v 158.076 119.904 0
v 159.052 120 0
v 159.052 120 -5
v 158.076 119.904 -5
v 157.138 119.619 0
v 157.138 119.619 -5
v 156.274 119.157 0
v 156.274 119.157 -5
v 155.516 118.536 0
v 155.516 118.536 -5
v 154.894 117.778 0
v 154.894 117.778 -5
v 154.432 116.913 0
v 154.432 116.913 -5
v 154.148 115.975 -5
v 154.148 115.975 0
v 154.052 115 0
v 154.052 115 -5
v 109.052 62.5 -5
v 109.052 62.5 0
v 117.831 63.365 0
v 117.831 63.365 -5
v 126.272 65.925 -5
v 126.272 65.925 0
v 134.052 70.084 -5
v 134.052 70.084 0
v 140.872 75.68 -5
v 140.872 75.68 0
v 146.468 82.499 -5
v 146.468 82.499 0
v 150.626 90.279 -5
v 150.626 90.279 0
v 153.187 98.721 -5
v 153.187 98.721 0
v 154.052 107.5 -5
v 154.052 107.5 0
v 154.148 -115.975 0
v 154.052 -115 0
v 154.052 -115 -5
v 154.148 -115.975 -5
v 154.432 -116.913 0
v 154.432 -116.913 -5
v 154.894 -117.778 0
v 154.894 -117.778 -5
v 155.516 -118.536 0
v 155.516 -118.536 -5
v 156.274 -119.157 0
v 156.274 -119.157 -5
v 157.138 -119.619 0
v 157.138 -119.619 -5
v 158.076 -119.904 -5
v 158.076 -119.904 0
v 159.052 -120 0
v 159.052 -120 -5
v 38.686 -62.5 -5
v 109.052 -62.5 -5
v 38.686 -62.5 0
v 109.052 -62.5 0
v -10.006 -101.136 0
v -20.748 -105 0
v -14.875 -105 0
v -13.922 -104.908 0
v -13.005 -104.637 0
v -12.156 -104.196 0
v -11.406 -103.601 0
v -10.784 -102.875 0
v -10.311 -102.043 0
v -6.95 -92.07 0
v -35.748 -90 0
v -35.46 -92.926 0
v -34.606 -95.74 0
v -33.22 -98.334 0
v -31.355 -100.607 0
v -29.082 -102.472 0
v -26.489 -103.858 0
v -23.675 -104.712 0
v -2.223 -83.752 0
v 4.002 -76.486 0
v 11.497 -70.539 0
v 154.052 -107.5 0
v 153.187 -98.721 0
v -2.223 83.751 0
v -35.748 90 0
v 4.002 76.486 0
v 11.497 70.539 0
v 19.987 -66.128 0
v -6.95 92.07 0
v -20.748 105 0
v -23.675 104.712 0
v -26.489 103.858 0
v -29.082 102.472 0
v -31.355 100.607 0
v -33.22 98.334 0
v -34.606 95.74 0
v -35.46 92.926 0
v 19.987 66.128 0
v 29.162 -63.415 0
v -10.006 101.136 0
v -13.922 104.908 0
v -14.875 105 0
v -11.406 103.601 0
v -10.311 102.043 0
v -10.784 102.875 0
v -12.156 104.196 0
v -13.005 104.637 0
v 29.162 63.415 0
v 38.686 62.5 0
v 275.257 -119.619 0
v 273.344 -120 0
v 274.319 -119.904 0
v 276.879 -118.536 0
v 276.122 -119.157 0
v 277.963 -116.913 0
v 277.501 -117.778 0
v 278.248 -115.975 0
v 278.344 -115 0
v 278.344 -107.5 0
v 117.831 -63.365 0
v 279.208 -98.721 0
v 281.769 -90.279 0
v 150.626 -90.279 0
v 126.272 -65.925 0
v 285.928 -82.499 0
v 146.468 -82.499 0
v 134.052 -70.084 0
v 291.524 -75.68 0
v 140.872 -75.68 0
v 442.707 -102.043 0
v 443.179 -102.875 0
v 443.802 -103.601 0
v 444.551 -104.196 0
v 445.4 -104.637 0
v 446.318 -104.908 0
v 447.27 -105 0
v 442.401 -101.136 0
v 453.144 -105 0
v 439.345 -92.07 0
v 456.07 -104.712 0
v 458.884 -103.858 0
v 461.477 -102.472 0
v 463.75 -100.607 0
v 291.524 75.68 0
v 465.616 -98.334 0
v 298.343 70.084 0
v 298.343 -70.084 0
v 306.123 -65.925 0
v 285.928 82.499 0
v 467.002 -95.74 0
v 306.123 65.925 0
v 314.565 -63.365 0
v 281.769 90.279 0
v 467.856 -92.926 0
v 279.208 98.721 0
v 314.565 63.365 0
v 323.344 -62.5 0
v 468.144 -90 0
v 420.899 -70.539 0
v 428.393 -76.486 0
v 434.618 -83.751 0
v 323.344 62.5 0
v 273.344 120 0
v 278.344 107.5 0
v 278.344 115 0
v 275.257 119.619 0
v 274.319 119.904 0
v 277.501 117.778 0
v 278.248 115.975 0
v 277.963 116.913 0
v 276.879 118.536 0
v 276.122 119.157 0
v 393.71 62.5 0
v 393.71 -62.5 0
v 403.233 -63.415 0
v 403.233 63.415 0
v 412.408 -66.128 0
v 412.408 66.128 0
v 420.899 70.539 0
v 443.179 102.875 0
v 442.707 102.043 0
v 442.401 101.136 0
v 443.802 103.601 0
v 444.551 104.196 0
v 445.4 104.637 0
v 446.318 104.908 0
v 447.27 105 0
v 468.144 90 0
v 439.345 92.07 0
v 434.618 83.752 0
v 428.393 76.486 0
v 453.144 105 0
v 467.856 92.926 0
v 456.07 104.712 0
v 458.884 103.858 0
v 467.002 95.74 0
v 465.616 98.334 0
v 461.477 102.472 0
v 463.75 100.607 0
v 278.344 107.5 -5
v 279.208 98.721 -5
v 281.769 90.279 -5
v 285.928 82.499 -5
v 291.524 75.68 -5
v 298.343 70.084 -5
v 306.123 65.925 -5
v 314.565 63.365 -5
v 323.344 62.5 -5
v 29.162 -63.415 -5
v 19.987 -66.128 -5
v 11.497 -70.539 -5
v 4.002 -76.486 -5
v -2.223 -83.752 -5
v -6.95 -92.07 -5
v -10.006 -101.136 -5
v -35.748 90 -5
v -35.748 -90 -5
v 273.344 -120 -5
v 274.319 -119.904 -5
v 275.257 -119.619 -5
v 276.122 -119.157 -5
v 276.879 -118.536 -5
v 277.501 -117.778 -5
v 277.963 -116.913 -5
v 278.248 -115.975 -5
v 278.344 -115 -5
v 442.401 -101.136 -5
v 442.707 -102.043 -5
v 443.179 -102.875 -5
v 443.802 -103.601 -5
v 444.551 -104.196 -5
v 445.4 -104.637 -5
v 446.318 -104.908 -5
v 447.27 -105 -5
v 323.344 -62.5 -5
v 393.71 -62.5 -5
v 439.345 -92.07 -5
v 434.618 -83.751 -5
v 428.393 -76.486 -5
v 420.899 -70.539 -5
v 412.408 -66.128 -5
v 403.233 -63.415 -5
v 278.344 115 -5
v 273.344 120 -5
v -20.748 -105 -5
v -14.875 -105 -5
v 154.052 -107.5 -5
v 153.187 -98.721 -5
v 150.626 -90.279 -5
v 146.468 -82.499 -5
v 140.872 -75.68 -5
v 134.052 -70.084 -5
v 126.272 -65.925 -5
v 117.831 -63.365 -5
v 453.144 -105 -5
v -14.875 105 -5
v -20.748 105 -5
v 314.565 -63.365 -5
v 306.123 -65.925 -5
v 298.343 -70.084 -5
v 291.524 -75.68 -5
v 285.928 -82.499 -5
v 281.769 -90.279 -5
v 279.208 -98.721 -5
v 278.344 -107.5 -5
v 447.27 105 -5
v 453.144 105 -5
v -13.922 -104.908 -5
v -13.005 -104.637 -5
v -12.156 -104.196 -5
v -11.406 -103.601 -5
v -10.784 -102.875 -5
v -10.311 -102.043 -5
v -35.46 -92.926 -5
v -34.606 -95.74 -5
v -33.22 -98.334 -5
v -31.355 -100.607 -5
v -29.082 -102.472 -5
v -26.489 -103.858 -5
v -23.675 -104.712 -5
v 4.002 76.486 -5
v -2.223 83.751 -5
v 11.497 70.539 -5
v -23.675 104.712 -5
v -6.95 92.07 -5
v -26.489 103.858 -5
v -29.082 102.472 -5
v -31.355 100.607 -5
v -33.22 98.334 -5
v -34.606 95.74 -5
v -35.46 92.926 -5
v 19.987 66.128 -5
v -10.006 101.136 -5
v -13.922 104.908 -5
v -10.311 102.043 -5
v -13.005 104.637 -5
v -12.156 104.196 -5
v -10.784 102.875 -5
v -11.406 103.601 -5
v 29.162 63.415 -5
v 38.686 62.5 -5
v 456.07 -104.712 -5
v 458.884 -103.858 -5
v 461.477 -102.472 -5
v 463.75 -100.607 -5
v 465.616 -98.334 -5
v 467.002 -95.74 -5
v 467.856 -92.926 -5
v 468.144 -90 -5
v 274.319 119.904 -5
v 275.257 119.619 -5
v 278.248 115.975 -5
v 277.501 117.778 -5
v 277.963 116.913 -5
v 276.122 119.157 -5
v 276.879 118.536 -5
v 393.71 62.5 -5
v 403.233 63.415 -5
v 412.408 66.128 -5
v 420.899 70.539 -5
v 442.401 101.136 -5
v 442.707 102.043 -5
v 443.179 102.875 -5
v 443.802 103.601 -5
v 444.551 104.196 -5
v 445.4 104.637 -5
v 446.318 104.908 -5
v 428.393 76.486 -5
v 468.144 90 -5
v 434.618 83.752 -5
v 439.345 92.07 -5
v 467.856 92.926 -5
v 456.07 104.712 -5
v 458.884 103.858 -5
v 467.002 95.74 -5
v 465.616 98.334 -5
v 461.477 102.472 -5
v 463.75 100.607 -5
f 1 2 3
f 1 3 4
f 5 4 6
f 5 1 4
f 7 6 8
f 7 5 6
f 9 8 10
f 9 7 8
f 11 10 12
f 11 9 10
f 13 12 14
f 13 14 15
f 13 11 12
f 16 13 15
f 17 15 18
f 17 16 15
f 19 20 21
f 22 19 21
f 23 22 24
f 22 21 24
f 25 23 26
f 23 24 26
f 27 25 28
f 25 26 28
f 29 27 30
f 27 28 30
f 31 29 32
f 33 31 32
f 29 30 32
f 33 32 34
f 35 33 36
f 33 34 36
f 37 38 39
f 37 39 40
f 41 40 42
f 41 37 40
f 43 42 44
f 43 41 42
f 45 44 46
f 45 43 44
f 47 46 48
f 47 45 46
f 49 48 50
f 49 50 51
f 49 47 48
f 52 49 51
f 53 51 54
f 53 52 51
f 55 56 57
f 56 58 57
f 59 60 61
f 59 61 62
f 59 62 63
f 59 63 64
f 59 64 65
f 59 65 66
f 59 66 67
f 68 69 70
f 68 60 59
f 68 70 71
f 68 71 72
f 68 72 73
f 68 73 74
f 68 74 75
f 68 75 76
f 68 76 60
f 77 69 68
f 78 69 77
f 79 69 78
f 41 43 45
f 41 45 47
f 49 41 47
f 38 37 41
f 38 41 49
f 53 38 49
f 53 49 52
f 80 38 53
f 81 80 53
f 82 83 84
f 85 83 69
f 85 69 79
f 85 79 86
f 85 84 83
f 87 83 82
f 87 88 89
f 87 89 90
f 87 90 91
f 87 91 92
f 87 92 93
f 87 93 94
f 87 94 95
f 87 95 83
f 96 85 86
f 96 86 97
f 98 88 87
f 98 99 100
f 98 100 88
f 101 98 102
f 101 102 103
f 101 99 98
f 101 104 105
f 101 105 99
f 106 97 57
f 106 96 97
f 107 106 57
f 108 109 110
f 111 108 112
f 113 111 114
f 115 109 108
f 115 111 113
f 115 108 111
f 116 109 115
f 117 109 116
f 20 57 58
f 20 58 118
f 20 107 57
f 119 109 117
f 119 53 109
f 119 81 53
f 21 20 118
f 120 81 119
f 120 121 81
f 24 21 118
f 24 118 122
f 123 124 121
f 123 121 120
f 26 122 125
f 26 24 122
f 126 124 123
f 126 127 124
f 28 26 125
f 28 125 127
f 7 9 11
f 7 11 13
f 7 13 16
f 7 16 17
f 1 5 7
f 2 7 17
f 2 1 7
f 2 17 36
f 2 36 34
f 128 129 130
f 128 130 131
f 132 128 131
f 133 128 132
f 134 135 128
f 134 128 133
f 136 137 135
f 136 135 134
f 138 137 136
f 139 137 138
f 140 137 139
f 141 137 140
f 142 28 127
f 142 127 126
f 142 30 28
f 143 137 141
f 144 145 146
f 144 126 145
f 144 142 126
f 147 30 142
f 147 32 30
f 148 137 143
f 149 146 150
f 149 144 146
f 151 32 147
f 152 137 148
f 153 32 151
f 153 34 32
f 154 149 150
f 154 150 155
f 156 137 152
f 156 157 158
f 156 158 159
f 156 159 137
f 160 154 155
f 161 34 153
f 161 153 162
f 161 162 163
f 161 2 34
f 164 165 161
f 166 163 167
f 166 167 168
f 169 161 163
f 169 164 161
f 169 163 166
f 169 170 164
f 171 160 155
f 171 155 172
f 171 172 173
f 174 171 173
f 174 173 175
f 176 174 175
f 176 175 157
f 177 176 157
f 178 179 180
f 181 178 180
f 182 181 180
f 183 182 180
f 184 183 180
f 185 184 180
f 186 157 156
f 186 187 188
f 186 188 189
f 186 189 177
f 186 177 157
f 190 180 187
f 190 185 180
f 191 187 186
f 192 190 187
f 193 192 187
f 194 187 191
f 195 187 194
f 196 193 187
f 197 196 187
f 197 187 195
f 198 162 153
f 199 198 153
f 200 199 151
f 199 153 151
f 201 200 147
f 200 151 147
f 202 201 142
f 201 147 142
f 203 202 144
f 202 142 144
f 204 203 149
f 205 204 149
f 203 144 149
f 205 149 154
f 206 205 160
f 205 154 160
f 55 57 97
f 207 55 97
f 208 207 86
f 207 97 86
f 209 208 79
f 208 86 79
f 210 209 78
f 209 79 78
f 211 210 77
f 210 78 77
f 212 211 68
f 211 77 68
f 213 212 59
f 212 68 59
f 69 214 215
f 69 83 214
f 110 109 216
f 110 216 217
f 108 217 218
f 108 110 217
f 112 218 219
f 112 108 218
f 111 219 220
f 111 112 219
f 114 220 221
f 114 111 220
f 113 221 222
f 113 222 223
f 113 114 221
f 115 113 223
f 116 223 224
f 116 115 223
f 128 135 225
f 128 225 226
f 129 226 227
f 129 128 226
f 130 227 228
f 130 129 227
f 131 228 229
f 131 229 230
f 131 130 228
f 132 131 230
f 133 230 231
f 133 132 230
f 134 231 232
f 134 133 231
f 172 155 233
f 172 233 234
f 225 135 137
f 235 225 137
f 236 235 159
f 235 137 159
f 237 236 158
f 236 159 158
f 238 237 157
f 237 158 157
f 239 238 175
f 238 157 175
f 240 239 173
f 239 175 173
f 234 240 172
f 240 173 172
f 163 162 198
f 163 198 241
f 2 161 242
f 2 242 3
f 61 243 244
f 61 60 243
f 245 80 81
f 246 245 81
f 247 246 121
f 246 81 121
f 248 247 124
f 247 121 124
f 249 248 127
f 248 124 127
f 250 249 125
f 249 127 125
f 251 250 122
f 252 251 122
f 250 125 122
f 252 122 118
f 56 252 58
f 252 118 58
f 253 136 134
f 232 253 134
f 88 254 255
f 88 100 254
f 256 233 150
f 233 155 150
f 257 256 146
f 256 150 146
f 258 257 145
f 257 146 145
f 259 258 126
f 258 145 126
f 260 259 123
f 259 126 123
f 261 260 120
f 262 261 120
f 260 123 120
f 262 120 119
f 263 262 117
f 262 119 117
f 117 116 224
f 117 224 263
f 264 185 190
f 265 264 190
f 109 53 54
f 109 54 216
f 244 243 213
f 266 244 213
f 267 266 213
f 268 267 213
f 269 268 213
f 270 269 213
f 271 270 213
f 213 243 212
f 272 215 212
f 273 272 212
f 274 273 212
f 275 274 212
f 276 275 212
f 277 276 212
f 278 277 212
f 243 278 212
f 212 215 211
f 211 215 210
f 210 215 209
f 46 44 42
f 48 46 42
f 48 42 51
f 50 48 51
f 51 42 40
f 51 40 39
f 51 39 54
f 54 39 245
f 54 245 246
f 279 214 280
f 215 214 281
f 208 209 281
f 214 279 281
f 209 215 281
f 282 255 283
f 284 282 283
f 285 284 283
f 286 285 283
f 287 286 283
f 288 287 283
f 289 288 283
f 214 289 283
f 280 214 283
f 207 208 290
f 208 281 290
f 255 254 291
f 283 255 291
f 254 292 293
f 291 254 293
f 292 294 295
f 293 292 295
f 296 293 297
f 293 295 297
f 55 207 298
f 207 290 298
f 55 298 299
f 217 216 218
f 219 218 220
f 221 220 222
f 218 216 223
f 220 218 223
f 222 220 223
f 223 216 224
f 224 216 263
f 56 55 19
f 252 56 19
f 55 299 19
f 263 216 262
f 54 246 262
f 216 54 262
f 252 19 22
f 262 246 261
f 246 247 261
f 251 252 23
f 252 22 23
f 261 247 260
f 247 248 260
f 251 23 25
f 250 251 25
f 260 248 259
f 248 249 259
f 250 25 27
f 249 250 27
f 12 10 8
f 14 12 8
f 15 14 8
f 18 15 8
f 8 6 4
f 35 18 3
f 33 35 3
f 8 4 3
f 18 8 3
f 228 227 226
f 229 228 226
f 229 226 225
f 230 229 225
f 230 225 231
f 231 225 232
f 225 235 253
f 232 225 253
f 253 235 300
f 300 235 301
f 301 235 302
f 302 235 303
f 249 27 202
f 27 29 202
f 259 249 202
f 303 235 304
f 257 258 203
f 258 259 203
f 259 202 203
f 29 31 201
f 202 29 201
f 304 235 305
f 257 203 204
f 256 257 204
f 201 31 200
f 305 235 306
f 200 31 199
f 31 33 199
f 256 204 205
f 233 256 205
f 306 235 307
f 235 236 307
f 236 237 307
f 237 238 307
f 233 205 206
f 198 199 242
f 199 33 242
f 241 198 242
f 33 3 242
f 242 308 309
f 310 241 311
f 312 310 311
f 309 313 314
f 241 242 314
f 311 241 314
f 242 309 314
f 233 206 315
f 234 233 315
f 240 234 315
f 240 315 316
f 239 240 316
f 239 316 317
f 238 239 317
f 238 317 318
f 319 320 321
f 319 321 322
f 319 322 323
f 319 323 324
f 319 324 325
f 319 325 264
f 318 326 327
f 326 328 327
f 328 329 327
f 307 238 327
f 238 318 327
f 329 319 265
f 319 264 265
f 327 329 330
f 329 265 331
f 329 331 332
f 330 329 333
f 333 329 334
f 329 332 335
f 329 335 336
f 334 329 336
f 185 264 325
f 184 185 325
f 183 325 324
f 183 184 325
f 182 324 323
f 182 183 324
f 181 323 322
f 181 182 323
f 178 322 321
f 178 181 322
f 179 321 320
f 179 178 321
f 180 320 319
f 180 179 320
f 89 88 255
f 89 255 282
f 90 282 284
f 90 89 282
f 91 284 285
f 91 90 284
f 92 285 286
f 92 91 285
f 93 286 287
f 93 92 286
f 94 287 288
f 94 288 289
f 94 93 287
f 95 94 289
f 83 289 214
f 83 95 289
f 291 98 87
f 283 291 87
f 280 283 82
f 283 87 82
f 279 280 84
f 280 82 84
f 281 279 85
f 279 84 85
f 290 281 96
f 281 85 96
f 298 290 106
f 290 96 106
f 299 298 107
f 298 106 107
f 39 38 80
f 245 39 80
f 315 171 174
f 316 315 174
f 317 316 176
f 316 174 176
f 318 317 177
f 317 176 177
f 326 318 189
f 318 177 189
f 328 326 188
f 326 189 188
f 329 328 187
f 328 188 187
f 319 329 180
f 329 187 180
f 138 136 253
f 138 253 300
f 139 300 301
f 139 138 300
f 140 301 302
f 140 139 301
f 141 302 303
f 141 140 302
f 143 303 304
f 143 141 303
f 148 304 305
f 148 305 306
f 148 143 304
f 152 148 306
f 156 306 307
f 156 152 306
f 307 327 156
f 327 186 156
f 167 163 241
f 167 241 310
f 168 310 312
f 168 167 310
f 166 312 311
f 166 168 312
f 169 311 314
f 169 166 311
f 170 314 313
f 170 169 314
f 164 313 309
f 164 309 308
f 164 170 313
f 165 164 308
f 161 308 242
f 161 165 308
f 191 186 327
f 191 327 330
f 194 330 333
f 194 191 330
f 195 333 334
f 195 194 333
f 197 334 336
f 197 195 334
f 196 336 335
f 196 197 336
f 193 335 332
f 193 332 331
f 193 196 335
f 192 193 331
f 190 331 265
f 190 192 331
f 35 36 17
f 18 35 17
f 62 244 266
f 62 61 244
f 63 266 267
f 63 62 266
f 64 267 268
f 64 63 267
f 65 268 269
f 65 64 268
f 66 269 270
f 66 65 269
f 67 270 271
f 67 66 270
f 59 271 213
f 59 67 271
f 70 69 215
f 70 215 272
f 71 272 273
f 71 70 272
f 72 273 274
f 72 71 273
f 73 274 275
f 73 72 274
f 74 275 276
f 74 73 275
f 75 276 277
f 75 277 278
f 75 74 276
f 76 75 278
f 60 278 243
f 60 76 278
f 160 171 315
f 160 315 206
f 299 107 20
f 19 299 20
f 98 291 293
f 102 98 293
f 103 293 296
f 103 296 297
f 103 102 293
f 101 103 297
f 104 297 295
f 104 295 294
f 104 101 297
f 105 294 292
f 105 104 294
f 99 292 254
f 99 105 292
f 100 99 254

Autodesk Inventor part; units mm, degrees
ref_plane "YZ Plane" through (0, 0, 0) normal (1, 0, 0) x (0, 1, 0)
ref_plane "XZ Plane" through (0, 0, 0) normal (0, 1, 0) x (-1, 0, 0)
ref_plane "XY Plane" through (0, 0, 0) normal (0, 0, 1) x (1, 0, 0)
sketch "Sketch1" plane through (0, 0, 0) normal (0, 0, 1) x (1, 0, 0)
  line L0 (323.3438, -62.5) -> (393.7095, -62.5) projected
  arc A0 (323.3438, -62.5) -> (278.3438, -107.5) centre (323.3438, -107.5) ccw projected
  line L1 (278.3438, -115) -> (278.3438, -107.5) projected
  arc A1 (273.3438, -120) -> (278.3438, -115) centre (273.3438, -115) ccw projected
  line L2 (149.8438, -120) -> (273.3438, -120) projected
  arc A2 (442.4011, -101.1364) -> (393.7095, -62.5) centre (393.7095, -112.5) ccw projected
  arc A3 (442.4011, -101.1364) -> (447.2702, -105) centre (447.2702, -100) ccw projected
  line L3 (453.1438, -105) -> (447.2702, -105) projected
  arc A4 (453.1438, -105) -> (468.1438, -90) centre (453.1438, -90) ccw projected
  line L4 (468.1438, 90) -> (468.1438, -90) projected
  arc A5 (468.1438, 90) -> (453.1438, 105) centre (453.1438, 90) ccw projected
  line L5 (447.2702, 105) -> (453.1438, 105) projected
  arc A6 (447.2702, 105) -> (442.4011, 101.1364) centre (447.2702, 100) ccw projected
  arc A7 (393.7095, 62.5) -> (442.4011, 101.1364) centre (393.7095, 112.5) ccw projected
  line L6 (393.7095, 62.5) -> (323.3438, 62.5) projected
  arc A8 (278.3438, 107.5) -> (323.3438, 62.5) centre (323.3438, 107.5) ccw projected
  line L7 (278.3438, 107.5) -> (278.3438, 115) projected
  arc A9 (278.3438, 115) -> (273.3438, 120) centre (273.3438, 115) ccw projected
  line L8 (273.3438, 120) -> (149.8438, 120) projected
  arc A10 (149.8438, 120) -> (144.8438, 115) centre (149.8438, 115) ccw projected
  line L9 (144.8438, 115) -> (144.8438, 107.5) projected
  arc A11 (124.8438, 87.5) -> (144.8438, 107.5) centre (124.8438, 107.5) ccw projected
  line L10 (106.6438, 87.5) -> (124.8438, 87.5) projected
  arc A12 (106.6438, 87.5) -> (101.6438, 82.5) centre (106.6438, 82.5) ccw projected
  line L11 (101.6438, 82.5) -> (101.6438, 63.25) projected
  arc A13 (96.6438, 58.25) -> (101.6438, 63.25) centre (96.6438, 63.25) ccw projected
  line L12 (91.6516, 58.25) -> (96.6438, 58.25) projected
  arc A14 (91.6516, 58.25) -> (85.6702, 54.8864) centre (91.6516, 51.25) ccw projected
  arc A15 (62.0674, 54.8864) -> (85.6702, 54.8864) centre (73.8688, 62.0613) ccw projected
  arc A16 (62.0674, 54.8864) -> (56.0861, 58.25) centre (56.0861, 51.25) ccw projected
  line L13 (56.0861, 58.25) -> (45.5938, 58.25) projected
  arc A17 (40.5938, 63.25) -> (45.5938, 58.25) centre (45.5938, 63.25) ccw projected
  line L14 (40.5938, 82.5) -> (40.5938, 63.25) projected
  arc A18 (40.5938, 82.5) -> (35.5938, 87.5) centre (35.5938, 82.5) ccw projected
  line L15 (10.1649, 87.5) -> (35.5938, 87.5) projected
  arc A19 (10.1649, 87.5) -> (5.2408, 83.3682) centre (10.1649, 82.5) ccw projected
  line L16 (-2.4062, 40) -> (5.2408, 83.3682) projected
  line L17 (-2.4062, -40) -> (-2.4062, 40) projected
  line L18 (-2.4062, -40) -> (5.2408, -83.3682) projected
  arc A20 (5.2408, -83.3682) -> (10.1649, -87.5) centre (10.1649, -82.5) ccw projected
  line L19 (35.5938, -87.5) -> (10.1649, -87.5) projected
  arc A21 (35.5938, -87.5) -> (40.5938, -82.5) centre (35.5938, -82.5) ccw projected
  line L20 (40.5938, -63.25) -> (40.5938, -82.5) projected
  arc A22 (45.5938, -58.25) -> (40.5938, -63.25) centre (45.5938, -63.25) ccw projected
  line L21 (56.0861, -58.25) -> (45.5938, -58.25) projected
  arc A23 (56.0861, -58.25) -> (62.0674, -54.8864) centre (56.0861, -51.25) ccw projected
  arc A24 (85.6702, -54.8864) -> (62.0674, -54.8864) centre (73.8688, -62.0613) ccw projected
  arc A25 (85.6702, -54.8864) -> (91.6516, -58.25) centre (91.6516, -51.25) ccw projected
  line L22 (91.6516, -58.25) -> (96.6438, -58.25) projected
  arc A26 (101.6438, -63.25) -> (96.6438, -58.25) centre (96.6438, -63.25) ccw projected
  line L23 (101.6438, -82.5) -> (101.6438, -63.25) projected
  arc A27 (101.6438, -82.5) -> (106.6438, -87.5) centre (106.6438, -82.5) ccw projected
  line L24 (106.6438, -87.5) -> (124.8438, -87.5) projected
  arc A28 (144.8438, -107.5) -> (124.8438, -87.5) centre (124.8438, -107.5) ccw projected
  line L25 (144.8438, -115) -> (144.8438, -107.5) projected
  arc A29 (144.8438, -115) -> (149.8438, -120) centre (149.8438, -115) ccw projected
  line L26 (216.1977, -168) -> (216.1977, 168)
  line L27 (109.0517, -62.5) -> (38.686, -62.5)
  arc A30 (154.0517, -107.5) -> (109.0517, -62.5) centre (109.0517, -107.5) ccw
  line L28 (154.0517, -115) -> (154.0517, -107.5)
  arc A31 (154.0517, -115) -> (159.0517, -120) centre (159.0517, -115) ccw
  line L29 (282.5517, -120) -> (159.0517, -120)
  arc A32 (38.686, -62.5) -> (-10.0056, -101.1364) centre (38.686, -112.5) ccw
  arc A33 (-14.8747, -105) -> (-10.0056, -101.1364) centre (-14.8747, -100) ccw
  line L30 (-20.7483, -105) -> (-14.8747, -105)
  arc A34 (-35.7483, -90) -> (-20.7483, -105) centre (-20.7483, -90) ccw
  line L31 (-35.7483, 90) -> (-35.7483, -90)
  arc A35 (-20.7483, 105) -> (-35.7483, 90) centre (-20.7483, 90) ccw
  line L32 (-14.8747, 105) -> (-20.7483, 105)
  arc A36 (-10.0056, 101.1364) -> (-14.8747, 105) centre (-14.8747, 100) ccw
  arc A37 (-10.0056, 101.1364) -> (38.686, 62.5) centre (38.686, 112.5) ccw
  line L33 (38.686, 62.5) -> (109.0517, 62.5)
  arc A38 (109.0517, 62.5) -> (154.0517, 107.5) centre (109.0517, 107.5) ccw
  line L34 (154.0517, 107.5) -> (154.0517, 115)
  arc A39 (159.0517, 120) -> (154.0517, 115) centre (159.0517, 115) ccw
  line L35 (159.0517, 120) -> (282.5517, 120)
  arc A40 (287.5517, 115) -> (282.5517, 120) centre (282.5517, 115) ccw
  line L36 (287.5517, 115) -> (287.5517, 107.5)
  arc A41 (287.5517, 107.5) -> (307.5517, 87.5) centre (307.5517, 107.5) ccw
  line L37 (325.7517, 87.5) -> (307.5517, 87.5)
  arc A42 (330.7517, 82.5) -> (325.7517, 87.5) centre (325.7517, 82.5) ccw
  line L38 (330.7517, 82.5) -> (330.7517, 63.25)
  arc A43 (330.7517, 63.25) -> (335.7517, 58.25) centre (335.7517, 63.25) ccw
  line L39 (340.7439, 58.25) -> (335.7517, 58.25)
  arc A44 (346.7253, 54.8864) -> (340.7439, 58.25) centre (340.7439, 51.25) ccw
  arc A45 (346.7253, 54.8864) -> (370.3281, 54.8864) centre (358.5267, 62.0613) ccw
  arc A46 (376.3094, 58.25) -> (370.3281, 54.8864) centre (376.3094, 51.25) ccw
  line L40 (376.3094, 58.25) -> (386.8017, 58.25)
  arc A47 (386.8017, 58.25) -> (391.8017, 63.25) centre (386.8017, 63.25) ccw
  line L41 (391.8017, 82.5) -> (391.8017, 63.25)
  arc A48 (396.8017, 87.5) -> (391.8017, 82.5) centre (396.8017, 82.5) ccw
  line L42 (422.2306, 87.5) -> (396.8017, 87.5)
  arc A49 (427.1547, 83.3682) -> (422.2306, 87.5) centre (422.2306, 82.5) ccw
  line L43 (434.8017, 40) -> (427.1547, 83.3682)
  line L44 (434.8017, -40) -> (434.8017, 40)
  line L45 (434.8017, -40) -> (427.1547, -83.3682)
  arc A50 (422.2306, -87.5) -> (427.1547, -83.3682) centre (422.2306, -82.5) ccw
  line L46 (396.8017, -87.5) -> (422.2306, -87.5)
  arc A51 (391.8017, -82.5) -> (396.8017, -87.5) centre (396.8017, -82.5) ccw
  line L47 (391.8017, -63.25) -> (391.8017, -82.5)
  arc A52 (391.8017, -63.25) -> (386.8017, -58.25) centre (386.8017, -63.25) ccw
  line L48 (376.3094, -58.25) -> (386.8017, -58.25)
  arc A53 (370.3281, -54.8864) -> (376.3094, -58.25) centre (376.3094, -51.25) ccw
  arc A54 (370.3281, -54.8864) -> (346.7253, -54.8864) centre (358.5267, -62.0613) ccw
  arc A55 (340.7439, -58.25) -> (346.7253, -54.8864) centre (340.7439, -51.25) ccw
  line L49 (340.7439, -58.25) -> (335.7517, -58.25)
  arc A56 (335.7517, -58.25) -> (330.7517, -63.25) centre (335.7517, -63.25) ccw
  line L50 (330.7517, -82.5) -> (330.7517, -63.25)
  arc A57 (325.7517, -87.5) -> (330.7517, -82.5) centre (325.7517, -82.5) ccw
  line L51 (325.7517, -87.5) -> (307.5517, -87.5)
  arc A58 (307.5517, -87.5) -> (287.5517, -107.5) centre (307.5517, -107.5) ccw
  line L52 (287.5517, -115) -> (287.5517, -107.5)
  arc A59 (282.5517, -120) -> (287.5517, -115) centre (282.5517, -115) ccw
  point P0 (0, 0)
  point P1 (432.3955, 0)
extrude "Extrusion1" add sketch "Sketch1" against normal blind 5 contours A0 L1 A1 L2 L26 L8 A9 L7 A8 L6 A43 L39 A44 A45 A46 L40 A47 A7 L43 L44 L45 A2 L0 A52 L48 A53 A54 A55 L49 A56 | A56 L49 A55 A54 A53 L48 A52 L0 | L45 L44 L43 A7 A6 L5 A5 L4 A4 L3 A3 A2 | L2 A31 L28 A30 L27 A26 L22 A25 A24 A23 L21 A22 A32 L18 L17 L16 A37 L33 A17 L13 A16 A15 A14 L12 A13 A38 L34 A39 L8 L26 | A47 L40 A46 A45 A44 L39 A43 L6 | L27 A22 L21 A23 A24 A25 L22 A26 | A13 L12 A14 A15 A16 L13 A17 L33 | A32 A33 L30 A34 L31 A35 L32 A36 A37 L16 L17 L18
properties part number "my_base"
